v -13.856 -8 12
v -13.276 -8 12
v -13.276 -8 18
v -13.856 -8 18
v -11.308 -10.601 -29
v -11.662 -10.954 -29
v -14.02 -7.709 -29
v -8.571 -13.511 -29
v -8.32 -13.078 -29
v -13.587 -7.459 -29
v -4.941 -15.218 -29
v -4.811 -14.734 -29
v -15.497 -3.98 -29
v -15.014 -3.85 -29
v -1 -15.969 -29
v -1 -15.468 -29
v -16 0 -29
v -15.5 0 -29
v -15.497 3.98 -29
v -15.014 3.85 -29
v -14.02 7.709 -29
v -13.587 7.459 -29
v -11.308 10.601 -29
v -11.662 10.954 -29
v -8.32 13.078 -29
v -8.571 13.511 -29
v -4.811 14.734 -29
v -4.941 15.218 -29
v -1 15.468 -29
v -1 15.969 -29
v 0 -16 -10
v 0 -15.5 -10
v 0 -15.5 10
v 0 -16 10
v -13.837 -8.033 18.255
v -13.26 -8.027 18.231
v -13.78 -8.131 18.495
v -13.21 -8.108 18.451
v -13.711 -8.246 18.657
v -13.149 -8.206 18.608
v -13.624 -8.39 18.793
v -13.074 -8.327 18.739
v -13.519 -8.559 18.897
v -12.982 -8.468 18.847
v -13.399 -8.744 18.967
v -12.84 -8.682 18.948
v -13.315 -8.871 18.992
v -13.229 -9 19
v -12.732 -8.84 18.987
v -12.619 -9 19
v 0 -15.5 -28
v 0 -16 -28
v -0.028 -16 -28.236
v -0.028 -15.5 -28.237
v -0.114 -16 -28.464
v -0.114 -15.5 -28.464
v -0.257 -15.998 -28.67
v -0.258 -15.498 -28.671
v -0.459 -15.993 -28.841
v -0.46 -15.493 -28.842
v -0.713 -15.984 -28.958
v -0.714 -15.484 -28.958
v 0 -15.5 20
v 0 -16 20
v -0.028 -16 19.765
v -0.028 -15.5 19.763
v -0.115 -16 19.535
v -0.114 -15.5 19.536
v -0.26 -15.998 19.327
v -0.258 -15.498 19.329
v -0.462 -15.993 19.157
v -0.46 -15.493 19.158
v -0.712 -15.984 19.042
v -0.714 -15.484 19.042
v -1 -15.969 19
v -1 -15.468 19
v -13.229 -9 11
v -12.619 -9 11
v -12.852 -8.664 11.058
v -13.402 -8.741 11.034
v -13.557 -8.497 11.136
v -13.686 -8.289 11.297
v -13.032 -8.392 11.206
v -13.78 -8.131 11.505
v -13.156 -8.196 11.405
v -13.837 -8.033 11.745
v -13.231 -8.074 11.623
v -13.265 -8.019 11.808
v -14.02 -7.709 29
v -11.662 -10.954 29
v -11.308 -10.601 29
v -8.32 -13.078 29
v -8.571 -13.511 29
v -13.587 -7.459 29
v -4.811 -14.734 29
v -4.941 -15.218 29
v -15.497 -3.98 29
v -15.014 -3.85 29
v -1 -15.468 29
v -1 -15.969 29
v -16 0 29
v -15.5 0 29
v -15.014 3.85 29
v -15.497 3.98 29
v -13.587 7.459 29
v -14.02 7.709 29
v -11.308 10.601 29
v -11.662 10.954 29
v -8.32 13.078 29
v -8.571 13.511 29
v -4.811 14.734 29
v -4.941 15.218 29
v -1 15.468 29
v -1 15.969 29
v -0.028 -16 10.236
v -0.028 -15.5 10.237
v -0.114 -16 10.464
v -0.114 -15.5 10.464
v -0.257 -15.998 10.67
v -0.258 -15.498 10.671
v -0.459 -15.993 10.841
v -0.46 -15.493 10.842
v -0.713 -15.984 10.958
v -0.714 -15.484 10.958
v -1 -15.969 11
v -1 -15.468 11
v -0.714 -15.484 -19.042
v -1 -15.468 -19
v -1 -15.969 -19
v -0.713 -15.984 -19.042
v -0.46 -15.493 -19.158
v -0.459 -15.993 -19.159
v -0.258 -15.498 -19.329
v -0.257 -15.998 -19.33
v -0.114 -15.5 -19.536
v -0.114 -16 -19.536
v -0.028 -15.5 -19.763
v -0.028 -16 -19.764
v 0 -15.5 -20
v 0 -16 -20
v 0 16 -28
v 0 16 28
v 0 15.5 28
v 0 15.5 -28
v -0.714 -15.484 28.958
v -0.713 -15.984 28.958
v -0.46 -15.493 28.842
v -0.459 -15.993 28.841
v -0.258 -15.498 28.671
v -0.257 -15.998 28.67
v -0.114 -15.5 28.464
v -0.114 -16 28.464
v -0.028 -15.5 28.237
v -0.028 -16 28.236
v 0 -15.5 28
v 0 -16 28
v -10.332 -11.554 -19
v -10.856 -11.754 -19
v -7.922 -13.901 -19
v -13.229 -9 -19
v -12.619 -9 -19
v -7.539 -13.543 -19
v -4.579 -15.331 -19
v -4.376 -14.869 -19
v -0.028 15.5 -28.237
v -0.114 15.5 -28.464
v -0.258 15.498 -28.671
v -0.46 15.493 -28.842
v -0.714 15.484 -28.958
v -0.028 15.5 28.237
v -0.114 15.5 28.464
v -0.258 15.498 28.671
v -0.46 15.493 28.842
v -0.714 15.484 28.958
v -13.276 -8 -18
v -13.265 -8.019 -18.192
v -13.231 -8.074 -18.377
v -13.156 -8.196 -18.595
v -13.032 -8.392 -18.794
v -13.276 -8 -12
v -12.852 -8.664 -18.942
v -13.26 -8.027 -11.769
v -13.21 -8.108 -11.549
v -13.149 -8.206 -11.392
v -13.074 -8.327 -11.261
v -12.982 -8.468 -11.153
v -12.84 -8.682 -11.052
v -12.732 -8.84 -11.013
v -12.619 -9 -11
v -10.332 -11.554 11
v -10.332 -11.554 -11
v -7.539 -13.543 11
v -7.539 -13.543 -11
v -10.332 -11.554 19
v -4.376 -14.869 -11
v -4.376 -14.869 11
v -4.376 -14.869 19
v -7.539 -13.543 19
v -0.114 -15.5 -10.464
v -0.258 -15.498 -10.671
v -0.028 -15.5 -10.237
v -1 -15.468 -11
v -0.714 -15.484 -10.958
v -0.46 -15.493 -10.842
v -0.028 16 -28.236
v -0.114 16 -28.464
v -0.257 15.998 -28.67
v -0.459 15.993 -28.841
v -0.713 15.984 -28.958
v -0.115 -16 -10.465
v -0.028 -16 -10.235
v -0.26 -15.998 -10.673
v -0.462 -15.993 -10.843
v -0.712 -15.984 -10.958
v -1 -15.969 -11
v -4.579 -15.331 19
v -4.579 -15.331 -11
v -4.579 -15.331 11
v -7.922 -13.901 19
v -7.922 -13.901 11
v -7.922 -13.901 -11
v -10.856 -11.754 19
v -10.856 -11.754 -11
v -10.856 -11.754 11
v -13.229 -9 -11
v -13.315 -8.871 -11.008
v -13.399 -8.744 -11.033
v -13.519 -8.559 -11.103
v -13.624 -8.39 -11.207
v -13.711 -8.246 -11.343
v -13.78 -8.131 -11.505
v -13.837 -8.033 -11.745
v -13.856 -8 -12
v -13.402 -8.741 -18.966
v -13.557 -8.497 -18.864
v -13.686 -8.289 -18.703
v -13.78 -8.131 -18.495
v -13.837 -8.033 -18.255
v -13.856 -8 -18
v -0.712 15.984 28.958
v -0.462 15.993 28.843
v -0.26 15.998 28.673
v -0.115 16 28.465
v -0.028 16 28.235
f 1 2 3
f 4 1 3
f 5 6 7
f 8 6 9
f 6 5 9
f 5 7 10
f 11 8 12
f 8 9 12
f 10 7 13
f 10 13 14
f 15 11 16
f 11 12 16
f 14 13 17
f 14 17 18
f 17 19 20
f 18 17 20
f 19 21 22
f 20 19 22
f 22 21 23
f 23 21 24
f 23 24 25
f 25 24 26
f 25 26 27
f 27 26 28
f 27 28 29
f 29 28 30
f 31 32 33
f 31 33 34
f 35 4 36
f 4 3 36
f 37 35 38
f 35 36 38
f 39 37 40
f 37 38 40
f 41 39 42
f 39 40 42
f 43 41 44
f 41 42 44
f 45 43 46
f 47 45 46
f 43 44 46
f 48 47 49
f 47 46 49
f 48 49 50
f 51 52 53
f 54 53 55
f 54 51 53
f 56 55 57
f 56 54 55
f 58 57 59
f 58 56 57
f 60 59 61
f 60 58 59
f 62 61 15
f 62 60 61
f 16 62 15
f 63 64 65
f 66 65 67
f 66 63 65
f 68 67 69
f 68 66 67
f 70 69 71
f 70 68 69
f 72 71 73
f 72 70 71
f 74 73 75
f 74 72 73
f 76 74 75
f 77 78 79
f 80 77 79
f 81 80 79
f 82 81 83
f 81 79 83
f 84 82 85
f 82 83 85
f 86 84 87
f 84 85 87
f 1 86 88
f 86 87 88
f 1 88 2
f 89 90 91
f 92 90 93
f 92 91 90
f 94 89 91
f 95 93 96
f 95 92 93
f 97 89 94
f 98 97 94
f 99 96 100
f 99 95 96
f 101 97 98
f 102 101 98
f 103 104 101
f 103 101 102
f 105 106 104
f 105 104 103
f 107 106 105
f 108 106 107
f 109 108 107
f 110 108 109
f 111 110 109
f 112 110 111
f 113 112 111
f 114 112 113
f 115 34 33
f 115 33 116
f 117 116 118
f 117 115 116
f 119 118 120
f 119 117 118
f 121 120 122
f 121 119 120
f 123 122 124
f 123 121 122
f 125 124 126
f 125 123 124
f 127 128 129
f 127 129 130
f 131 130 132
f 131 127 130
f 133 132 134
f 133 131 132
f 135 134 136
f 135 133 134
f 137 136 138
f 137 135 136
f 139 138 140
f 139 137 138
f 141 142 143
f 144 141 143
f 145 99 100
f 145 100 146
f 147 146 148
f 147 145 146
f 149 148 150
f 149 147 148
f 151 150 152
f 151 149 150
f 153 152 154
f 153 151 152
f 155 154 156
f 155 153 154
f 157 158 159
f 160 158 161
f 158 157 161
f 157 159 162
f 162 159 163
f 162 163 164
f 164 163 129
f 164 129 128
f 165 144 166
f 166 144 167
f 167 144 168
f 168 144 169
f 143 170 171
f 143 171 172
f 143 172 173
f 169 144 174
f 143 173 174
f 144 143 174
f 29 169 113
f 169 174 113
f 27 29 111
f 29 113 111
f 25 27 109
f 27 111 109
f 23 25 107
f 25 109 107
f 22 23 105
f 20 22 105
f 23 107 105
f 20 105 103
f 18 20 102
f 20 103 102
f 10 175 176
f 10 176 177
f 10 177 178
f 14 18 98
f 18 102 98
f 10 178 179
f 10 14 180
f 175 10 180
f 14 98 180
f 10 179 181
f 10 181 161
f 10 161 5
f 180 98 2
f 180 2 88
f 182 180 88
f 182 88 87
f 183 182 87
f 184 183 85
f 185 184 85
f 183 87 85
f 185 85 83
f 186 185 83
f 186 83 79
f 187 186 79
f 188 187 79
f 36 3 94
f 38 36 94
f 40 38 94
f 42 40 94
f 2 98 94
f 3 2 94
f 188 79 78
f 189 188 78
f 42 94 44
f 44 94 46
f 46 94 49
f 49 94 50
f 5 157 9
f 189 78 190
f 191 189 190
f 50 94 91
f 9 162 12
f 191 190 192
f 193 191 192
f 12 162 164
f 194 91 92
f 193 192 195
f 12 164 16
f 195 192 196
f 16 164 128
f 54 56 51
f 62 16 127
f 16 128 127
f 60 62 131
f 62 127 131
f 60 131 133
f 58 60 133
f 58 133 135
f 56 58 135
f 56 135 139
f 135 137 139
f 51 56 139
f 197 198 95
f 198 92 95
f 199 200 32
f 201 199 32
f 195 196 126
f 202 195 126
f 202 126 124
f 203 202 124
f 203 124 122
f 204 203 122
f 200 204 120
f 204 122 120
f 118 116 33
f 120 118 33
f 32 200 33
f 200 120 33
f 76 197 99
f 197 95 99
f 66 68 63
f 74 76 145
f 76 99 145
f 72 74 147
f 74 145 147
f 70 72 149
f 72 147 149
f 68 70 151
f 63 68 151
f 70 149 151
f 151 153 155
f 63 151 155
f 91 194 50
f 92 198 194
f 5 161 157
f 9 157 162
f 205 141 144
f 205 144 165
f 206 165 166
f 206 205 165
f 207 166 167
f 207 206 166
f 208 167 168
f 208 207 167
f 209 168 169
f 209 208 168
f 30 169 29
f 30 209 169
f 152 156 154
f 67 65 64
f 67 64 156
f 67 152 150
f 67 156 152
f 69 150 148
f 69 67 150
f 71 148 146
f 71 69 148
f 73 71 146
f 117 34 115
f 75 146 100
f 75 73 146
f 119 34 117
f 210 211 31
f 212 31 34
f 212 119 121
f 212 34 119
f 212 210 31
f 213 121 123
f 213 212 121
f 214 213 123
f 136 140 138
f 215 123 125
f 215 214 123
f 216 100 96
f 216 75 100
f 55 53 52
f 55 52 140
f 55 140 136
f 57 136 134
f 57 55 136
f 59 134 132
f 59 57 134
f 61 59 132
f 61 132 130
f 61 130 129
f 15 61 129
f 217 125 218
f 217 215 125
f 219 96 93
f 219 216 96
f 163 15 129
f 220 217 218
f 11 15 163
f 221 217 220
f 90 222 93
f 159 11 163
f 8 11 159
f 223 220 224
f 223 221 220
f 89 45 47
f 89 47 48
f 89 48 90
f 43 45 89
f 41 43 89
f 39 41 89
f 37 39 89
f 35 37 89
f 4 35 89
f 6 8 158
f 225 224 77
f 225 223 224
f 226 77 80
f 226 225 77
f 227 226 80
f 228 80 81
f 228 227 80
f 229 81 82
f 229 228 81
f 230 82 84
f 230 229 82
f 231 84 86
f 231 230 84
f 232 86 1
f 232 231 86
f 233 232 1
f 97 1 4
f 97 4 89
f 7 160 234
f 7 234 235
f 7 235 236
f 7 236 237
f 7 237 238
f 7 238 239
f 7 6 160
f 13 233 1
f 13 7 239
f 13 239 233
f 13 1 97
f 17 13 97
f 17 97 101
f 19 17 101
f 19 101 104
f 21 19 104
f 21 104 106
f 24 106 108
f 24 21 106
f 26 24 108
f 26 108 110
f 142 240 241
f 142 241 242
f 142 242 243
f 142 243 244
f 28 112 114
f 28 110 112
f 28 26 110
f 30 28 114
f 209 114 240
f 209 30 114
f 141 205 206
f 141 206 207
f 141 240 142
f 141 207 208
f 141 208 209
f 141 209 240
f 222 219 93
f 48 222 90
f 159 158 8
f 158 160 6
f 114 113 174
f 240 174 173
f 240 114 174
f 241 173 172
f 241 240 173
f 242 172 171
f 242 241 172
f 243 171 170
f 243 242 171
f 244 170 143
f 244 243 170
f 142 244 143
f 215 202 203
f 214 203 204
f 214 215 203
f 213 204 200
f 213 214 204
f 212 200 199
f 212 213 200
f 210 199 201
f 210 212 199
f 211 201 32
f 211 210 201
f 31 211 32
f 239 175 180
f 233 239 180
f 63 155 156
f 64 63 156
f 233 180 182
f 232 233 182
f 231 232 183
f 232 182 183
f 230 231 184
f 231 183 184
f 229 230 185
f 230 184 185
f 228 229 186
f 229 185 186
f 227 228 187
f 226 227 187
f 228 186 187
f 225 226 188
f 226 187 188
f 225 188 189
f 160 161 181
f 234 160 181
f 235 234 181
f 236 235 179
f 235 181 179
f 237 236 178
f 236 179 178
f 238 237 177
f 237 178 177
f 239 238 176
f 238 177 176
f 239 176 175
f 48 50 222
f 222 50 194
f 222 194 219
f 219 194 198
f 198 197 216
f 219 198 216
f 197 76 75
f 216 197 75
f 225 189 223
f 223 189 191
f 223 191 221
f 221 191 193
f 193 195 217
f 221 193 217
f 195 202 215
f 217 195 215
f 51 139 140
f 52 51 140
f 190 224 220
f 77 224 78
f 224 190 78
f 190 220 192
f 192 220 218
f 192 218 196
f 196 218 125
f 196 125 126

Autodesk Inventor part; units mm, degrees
ref_plane "YZ Plane" through (0, 0, 0) normal (1, 0, 0) x (0, 1, 0)
ref_plane "XZ Plane" through (0, 0, 0) normal (0, 1, 0) x (-1, 0, 0)
ref_plane "XY Plane" through (0, 0, 0) normal (0, 0, 1) x (1, 0, 0)
sketch "Sketch1" plane through (0, 0, 0) normal (0, 0, 1) x (1, 0, 0)
  circle A0 centre (0, 0) radius 15.5
  circle A1 centre (0, 0) radius 16
  dimension "d0" = 32
  dimension "d1" = 0.5
extrude "Extrusion1" add sketch "Sketch1" along normal mid plane 58
sketch "Sketch3" plane through (0, 0, 29) normal (0, 0, 1) x (1, 0, 0)
  circle A0 centre (0, 0) radius 15.5 construction
  circle A1 centre (0, 0) radius 16 construction
  line L0 (0, -20) -> (20, -20)
  line L1 (20, -20) -> (20, 20)
  line L2 (20, 20) -> (0, 20)
  line L3 (0, 20) -> (0, -20)
  dimension "d8" = 20
  dimension "d9" = 40
extrude "Extrusion3" cut sketch "Sketch3" against normal through all
sketch "Sketch4" plane through (0, 0, 0) normal (1, 0, 0) x (0, 1, 0)
  line L0 (-18, -19) -> (-8, -19)
  line L1 (-8, -19) -> (-8, -11)
  line L2 (-8, -11) -> (-18, -11)
  line L3 (-18, -11) -> (-18, -19)
  line L4 (-16, -29) -> (16, -29) projected
  line L5 (-16, -29) -> (-16, 29) projected
  point P0 (0, 0)
  dimension "d12" = 8
  dimension "d13" = 10
  dimension "d14" = 2
  dimension "d17" = 8
extrude "Extrusion4" cut sketch "Sketch4" against normal through all
mirror "Mirror1" about plane through (0, 0, 0) normal (0, 0, 1) of "Extrusion4"
fillet "Fillet1" radius 1 12 edges at (0, -15.75, 19) (0, -15.75, 11) (0, -15.75, 29) (0, 15.75, 29) (-13.5662, -8, 19) (-13.5662, -8, 11) (-13.5662, -8, -11) (0, -15.75, -11) (-13.5662, -8, -19) (0, -15.75, -19) (0, -15.75, -29) (0, 15.75, -29)
properties part number "LP-screen-sheet-metal" material "Stainless Steel"
